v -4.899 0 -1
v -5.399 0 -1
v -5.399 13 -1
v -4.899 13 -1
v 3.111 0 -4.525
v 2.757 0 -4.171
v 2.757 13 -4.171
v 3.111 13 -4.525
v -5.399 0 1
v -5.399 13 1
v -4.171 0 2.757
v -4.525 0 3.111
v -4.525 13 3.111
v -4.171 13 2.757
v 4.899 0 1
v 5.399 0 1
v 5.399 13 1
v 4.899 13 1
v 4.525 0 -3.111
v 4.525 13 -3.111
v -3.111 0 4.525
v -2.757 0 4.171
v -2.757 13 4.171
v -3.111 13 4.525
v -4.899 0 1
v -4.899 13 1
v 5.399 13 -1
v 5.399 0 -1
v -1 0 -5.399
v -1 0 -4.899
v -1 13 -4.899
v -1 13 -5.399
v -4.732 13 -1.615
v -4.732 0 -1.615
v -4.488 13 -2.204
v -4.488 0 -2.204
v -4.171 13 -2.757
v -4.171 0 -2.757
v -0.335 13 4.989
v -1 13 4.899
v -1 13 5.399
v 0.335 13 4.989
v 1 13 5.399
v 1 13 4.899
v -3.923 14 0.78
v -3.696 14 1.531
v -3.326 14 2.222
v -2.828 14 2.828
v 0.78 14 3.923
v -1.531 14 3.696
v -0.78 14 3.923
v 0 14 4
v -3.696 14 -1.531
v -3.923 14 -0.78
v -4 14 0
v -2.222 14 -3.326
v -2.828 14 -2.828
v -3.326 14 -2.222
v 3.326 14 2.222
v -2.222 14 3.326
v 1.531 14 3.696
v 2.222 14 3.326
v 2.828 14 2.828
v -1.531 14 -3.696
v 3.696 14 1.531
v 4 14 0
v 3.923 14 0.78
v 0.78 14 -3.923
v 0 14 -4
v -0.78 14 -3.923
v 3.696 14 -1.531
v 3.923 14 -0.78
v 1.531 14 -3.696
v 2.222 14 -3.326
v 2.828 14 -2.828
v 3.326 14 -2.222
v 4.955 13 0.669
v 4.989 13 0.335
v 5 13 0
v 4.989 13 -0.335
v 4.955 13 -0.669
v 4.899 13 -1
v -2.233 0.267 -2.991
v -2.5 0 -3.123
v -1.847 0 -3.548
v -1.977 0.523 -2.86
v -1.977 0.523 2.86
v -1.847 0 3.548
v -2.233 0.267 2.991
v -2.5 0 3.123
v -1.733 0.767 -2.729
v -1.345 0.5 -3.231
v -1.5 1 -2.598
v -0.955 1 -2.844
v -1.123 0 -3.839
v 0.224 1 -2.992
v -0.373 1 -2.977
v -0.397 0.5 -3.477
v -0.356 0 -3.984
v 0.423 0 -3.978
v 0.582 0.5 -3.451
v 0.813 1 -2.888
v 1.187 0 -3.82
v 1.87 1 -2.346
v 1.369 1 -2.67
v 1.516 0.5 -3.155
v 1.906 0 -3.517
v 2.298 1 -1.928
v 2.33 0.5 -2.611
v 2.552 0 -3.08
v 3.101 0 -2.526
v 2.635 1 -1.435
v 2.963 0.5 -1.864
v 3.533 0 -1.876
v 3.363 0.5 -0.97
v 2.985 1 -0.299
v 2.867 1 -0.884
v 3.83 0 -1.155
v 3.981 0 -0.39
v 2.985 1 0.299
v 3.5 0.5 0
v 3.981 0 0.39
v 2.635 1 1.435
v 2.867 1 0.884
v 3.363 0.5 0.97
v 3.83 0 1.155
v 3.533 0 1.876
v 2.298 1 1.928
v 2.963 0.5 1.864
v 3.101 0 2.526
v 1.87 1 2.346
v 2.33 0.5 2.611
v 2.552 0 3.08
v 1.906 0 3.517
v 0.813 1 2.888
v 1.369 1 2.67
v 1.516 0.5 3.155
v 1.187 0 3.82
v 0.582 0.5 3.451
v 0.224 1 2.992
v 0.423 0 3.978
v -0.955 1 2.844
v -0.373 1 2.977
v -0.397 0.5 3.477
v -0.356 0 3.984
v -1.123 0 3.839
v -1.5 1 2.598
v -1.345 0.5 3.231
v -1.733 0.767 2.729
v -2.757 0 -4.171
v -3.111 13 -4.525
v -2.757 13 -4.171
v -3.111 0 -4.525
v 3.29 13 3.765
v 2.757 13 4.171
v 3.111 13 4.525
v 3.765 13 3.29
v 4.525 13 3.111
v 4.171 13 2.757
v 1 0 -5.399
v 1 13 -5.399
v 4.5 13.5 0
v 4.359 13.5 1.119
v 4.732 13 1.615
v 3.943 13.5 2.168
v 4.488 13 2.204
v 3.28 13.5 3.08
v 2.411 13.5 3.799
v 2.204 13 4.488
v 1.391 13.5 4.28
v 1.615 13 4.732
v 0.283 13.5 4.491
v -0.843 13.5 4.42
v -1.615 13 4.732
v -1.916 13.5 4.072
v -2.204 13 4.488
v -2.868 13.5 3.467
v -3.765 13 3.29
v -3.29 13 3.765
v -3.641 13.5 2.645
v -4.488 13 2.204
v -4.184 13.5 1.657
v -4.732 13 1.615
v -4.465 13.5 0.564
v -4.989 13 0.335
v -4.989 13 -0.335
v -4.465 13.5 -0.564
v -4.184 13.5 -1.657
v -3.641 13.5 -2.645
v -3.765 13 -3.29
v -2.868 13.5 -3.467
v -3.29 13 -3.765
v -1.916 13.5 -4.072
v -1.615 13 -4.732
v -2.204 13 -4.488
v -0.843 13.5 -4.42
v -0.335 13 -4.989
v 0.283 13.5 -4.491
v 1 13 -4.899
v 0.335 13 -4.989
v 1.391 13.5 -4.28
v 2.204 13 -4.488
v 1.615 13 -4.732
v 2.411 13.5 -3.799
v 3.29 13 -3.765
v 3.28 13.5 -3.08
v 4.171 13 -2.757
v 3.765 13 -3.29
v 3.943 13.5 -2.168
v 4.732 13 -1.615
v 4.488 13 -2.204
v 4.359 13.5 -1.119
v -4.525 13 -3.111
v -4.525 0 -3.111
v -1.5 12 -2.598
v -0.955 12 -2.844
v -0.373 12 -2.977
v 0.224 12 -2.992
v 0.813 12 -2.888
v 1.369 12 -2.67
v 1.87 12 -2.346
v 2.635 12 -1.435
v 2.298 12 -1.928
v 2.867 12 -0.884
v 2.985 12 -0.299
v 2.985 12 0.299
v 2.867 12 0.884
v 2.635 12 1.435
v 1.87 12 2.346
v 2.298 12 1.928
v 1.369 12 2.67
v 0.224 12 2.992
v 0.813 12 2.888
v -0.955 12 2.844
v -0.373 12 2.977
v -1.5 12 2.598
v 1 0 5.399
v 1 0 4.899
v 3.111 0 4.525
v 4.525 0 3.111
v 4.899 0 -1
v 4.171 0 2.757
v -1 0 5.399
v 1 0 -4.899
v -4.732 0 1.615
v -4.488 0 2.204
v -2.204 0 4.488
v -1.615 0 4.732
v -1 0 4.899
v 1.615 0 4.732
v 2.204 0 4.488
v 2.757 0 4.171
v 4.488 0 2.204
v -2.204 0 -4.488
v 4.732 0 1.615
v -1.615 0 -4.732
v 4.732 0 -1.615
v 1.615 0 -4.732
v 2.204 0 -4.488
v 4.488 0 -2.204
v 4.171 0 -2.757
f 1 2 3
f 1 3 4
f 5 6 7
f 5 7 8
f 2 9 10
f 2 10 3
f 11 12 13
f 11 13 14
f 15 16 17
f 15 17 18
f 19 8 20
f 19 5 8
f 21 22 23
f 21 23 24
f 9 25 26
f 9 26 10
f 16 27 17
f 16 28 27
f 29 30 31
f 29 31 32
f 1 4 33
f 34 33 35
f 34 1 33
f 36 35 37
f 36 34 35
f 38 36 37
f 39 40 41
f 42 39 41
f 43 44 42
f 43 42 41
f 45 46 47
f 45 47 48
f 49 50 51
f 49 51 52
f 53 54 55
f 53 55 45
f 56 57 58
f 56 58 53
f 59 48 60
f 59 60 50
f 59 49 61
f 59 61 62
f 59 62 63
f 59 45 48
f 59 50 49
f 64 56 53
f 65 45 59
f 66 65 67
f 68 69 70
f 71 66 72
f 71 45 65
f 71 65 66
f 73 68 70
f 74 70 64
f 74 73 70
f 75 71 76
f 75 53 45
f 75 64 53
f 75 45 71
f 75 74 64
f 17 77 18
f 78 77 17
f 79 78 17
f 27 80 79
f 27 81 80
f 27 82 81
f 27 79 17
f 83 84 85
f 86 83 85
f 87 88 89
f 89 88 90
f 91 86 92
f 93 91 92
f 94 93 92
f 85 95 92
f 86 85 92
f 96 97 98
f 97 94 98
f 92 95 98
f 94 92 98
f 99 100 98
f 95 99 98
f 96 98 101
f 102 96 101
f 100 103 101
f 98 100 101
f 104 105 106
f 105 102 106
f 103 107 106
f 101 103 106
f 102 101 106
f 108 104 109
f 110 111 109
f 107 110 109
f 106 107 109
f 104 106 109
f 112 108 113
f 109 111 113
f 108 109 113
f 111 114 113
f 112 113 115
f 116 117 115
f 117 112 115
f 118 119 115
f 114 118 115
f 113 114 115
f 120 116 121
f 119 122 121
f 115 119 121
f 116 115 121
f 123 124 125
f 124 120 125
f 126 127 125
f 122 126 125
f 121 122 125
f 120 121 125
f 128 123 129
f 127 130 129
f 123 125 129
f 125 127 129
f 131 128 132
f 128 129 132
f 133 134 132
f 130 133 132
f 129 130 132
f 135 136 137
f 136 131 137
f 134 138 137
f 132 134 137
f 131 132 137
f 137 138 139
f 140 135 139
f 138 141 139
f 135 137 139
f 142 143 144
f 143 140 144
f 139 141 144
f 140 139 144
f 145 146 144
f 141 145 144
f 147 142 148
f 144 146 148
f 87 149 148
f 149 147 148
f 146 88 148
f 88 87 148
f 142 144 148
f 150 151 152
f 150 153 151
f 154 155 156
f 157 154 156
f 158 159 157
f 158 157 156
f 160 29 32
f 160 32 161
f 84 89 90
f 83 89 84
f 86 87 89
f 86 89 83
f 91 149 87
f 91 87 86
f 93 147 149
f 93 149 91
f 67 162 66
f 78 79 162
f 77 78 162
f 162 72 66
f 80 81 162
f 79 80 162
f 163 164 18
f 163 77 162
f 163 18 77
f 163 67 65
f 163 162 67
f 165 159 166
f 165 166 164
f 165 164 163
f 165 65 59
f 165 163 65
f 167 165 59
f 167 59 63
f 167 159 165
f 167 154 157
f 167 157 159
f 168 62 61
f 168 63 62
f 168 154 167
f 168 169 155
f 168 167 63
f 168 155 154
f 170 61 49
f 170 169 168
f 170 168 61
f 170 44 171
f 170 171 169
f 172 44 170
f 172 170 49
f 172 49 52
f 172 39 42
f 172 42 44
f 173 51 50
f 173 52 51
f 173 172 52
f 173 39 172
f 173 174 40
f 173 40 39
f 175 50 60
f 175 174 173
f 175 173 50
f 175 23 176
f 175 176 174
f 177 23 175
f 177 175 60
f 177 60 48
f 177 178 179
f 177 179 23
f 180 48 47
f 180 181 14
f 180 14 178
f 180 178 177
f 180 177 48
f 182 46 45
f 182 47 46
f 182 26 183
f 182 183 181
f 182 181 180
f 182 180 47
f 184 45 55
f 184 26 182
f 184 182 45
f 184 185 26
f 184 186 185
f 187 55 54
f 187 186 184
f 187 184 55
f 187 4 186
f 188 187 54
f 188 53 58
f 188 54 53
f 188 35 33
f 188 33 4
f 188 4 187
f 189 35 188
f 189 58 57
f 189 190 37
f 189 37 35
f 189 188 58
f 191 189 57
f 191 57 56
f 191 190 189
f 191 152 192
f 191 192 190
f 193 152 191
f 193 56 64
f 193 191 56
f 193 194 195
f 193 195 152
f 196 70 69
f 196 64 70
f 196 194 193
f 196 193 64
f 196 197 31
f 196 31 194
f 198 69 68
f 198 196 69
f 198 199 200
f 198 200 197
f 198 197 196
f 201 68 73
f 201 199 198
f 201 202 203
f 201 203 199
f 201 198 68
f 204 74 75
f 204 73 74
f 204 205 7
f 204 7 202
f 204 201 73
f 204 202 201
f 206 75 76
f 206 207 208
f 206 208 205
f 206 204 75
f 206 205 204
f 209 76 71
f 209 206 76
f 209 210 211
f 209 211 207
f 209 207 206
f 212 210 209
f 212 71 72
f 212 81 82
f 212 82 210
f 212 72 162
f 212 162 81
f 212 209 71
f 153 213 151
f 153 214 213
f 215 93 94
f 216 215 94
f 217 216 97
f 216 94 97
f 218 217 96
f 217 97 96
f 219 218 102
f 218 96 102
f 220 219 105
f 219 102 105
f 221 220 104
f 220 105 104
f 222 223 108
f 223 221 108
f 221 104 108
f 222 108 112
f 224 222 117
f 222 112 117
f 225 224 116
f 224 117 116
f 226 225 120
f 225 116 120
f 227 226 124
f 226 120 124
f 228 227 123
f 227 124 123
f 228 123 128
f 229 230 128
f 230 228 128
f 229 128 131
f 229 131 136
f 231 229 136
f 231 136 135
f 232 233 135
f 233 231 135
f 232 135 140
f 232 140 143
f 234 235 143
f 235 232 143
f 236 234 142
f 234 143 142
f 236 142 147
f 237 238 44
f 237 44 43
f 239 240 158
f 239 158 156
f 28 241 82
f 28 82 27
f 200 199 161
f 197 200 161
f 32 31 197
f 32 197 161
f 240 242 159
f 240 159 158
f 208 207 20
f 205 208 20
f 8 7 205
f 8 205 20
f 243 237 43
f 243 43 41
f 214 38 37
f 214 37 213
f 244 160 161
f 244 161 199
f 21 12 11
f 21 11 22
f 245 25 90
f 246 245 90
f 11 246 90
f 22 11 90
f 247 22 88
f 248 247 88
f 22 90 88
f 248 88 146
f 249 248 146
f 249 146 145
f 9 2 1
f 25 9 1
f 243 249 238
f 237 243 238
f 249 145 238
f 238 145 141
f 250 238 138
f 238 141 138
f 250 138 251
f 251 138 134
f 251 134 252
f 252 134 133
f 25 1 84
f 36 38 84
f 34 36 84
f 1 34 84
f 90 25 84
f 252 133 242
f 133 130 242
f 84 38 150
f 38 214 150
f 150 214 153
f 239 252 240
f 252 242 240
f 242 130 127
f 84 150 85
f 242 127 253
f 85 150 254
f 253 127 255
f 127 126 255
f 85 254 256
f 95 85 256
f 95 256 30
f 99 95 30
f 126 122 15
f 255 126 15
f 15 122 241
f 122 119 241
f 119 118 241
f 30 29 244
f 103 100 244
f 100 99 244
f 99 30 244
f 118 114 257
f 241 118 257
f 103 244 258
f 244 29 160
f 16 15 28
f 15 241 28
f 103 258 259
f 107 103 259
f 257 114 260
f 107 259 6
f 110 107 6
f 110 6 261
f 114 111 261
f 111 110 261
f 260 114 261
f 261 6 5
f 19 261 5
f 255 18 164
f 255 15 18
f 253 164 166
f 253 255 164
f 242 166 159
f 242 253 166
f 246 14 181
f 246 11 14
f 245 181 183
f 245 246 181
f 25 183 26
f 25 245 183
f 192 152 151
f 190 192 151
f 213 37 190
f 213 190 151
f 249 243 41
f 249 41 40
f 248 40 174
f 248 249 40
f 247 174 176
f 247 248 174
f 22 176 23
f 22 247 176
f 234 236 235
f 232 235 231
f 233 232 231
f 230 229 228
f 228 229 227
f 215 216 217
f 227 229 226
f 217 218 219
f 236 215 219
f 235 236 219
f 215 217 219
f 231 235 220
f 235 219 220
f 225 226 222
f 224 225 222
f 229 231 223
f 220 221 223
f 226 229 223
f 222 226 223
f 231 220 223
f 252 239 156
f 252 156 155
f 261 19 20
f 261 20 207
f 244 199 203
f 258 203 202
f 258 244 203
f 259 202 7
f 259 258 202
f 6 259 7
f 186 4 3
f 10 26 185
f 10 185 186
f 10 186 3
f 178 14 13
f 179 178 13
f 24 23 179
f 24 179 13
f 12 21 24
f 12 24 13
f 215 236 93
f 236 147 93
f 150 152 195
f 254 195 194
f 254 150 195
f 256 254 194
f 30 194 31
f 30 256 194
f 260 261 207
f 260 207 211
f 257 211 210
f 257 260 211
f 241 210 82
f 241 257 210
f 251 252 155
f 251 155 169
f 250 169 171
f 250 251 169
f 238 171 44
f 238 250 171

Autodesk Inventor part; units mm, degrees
ref_plane "YZ Plane" through (0, 0, 0) normal (1, 0, 0) x (0, 1, 0)
ref_plane "XY Plane" through (0, 0, 0) normal (0, 0, 1) x (1, 0, 0)
sketch "Sketch1" plane through (0, 0, 0) normal (0, 1, 0) x (-1, 0, 0)
  arc A0 (1.5, 2.5981) -> (1.5, -2.5981) centre (0, 0) ccw
  line L0 (1.5, 2.5981) -> (1.5, -2.5981)
  line L1 (1.5, 0) -> (-3, 0) construction
  circle A1 centre (0, 0) radius 5
  dimension "d0" = 6
  dimension "d1" = 4.5
  dimension "d2" = 10
extrude "Extrusion1" add sketch "Sketch1" along normal blind 12
sketch "Sketch2" plane through (0, 12, 0) normal (0, 1, 0) x (1, 0, 0)
  circle A0 centre (0, 0) radius 5
extrude "Extrusion2" add sketch "Sketch2" along normal blind 2
chamfer "Chamfer1" distance 1 angle 45 1 edges at (-5, 14, 0)
sketch "Sketch3" plane through (0, 0, 0) normal (0, 1, 0) x (-1, 0, 0)
  circle A0 centre (0, 0) radius 5 projected
  line L0 (4.899, 1) -> (5.399, 1)
  line L1 (5.399, 1) -> (5.399, -1)
  line L2 (5.399, -1) -> (4.899, -1)
  arc A1 (4.899, -1) -> (4.899, 1) centre (0, 0) ccw
  dimension "d10" = 2
  dimension "d11" = 0.5
  dimension "d12" = 1
extrude "Extrusion3" add sketch "Sketch3" along normal blind 13 contours A0 L0 L1 L2
pattern_circular "Circular Pattern1" count 8 over 360 about axis through (0, 0, 0) along (0, 1, 0) of "Extrusion3"
chamfer "Chamfer2" distance 1 angle 45 2 edges at (-1.5, 0, 0) (3, 0, 0)
properties part number "Pot-knob"
